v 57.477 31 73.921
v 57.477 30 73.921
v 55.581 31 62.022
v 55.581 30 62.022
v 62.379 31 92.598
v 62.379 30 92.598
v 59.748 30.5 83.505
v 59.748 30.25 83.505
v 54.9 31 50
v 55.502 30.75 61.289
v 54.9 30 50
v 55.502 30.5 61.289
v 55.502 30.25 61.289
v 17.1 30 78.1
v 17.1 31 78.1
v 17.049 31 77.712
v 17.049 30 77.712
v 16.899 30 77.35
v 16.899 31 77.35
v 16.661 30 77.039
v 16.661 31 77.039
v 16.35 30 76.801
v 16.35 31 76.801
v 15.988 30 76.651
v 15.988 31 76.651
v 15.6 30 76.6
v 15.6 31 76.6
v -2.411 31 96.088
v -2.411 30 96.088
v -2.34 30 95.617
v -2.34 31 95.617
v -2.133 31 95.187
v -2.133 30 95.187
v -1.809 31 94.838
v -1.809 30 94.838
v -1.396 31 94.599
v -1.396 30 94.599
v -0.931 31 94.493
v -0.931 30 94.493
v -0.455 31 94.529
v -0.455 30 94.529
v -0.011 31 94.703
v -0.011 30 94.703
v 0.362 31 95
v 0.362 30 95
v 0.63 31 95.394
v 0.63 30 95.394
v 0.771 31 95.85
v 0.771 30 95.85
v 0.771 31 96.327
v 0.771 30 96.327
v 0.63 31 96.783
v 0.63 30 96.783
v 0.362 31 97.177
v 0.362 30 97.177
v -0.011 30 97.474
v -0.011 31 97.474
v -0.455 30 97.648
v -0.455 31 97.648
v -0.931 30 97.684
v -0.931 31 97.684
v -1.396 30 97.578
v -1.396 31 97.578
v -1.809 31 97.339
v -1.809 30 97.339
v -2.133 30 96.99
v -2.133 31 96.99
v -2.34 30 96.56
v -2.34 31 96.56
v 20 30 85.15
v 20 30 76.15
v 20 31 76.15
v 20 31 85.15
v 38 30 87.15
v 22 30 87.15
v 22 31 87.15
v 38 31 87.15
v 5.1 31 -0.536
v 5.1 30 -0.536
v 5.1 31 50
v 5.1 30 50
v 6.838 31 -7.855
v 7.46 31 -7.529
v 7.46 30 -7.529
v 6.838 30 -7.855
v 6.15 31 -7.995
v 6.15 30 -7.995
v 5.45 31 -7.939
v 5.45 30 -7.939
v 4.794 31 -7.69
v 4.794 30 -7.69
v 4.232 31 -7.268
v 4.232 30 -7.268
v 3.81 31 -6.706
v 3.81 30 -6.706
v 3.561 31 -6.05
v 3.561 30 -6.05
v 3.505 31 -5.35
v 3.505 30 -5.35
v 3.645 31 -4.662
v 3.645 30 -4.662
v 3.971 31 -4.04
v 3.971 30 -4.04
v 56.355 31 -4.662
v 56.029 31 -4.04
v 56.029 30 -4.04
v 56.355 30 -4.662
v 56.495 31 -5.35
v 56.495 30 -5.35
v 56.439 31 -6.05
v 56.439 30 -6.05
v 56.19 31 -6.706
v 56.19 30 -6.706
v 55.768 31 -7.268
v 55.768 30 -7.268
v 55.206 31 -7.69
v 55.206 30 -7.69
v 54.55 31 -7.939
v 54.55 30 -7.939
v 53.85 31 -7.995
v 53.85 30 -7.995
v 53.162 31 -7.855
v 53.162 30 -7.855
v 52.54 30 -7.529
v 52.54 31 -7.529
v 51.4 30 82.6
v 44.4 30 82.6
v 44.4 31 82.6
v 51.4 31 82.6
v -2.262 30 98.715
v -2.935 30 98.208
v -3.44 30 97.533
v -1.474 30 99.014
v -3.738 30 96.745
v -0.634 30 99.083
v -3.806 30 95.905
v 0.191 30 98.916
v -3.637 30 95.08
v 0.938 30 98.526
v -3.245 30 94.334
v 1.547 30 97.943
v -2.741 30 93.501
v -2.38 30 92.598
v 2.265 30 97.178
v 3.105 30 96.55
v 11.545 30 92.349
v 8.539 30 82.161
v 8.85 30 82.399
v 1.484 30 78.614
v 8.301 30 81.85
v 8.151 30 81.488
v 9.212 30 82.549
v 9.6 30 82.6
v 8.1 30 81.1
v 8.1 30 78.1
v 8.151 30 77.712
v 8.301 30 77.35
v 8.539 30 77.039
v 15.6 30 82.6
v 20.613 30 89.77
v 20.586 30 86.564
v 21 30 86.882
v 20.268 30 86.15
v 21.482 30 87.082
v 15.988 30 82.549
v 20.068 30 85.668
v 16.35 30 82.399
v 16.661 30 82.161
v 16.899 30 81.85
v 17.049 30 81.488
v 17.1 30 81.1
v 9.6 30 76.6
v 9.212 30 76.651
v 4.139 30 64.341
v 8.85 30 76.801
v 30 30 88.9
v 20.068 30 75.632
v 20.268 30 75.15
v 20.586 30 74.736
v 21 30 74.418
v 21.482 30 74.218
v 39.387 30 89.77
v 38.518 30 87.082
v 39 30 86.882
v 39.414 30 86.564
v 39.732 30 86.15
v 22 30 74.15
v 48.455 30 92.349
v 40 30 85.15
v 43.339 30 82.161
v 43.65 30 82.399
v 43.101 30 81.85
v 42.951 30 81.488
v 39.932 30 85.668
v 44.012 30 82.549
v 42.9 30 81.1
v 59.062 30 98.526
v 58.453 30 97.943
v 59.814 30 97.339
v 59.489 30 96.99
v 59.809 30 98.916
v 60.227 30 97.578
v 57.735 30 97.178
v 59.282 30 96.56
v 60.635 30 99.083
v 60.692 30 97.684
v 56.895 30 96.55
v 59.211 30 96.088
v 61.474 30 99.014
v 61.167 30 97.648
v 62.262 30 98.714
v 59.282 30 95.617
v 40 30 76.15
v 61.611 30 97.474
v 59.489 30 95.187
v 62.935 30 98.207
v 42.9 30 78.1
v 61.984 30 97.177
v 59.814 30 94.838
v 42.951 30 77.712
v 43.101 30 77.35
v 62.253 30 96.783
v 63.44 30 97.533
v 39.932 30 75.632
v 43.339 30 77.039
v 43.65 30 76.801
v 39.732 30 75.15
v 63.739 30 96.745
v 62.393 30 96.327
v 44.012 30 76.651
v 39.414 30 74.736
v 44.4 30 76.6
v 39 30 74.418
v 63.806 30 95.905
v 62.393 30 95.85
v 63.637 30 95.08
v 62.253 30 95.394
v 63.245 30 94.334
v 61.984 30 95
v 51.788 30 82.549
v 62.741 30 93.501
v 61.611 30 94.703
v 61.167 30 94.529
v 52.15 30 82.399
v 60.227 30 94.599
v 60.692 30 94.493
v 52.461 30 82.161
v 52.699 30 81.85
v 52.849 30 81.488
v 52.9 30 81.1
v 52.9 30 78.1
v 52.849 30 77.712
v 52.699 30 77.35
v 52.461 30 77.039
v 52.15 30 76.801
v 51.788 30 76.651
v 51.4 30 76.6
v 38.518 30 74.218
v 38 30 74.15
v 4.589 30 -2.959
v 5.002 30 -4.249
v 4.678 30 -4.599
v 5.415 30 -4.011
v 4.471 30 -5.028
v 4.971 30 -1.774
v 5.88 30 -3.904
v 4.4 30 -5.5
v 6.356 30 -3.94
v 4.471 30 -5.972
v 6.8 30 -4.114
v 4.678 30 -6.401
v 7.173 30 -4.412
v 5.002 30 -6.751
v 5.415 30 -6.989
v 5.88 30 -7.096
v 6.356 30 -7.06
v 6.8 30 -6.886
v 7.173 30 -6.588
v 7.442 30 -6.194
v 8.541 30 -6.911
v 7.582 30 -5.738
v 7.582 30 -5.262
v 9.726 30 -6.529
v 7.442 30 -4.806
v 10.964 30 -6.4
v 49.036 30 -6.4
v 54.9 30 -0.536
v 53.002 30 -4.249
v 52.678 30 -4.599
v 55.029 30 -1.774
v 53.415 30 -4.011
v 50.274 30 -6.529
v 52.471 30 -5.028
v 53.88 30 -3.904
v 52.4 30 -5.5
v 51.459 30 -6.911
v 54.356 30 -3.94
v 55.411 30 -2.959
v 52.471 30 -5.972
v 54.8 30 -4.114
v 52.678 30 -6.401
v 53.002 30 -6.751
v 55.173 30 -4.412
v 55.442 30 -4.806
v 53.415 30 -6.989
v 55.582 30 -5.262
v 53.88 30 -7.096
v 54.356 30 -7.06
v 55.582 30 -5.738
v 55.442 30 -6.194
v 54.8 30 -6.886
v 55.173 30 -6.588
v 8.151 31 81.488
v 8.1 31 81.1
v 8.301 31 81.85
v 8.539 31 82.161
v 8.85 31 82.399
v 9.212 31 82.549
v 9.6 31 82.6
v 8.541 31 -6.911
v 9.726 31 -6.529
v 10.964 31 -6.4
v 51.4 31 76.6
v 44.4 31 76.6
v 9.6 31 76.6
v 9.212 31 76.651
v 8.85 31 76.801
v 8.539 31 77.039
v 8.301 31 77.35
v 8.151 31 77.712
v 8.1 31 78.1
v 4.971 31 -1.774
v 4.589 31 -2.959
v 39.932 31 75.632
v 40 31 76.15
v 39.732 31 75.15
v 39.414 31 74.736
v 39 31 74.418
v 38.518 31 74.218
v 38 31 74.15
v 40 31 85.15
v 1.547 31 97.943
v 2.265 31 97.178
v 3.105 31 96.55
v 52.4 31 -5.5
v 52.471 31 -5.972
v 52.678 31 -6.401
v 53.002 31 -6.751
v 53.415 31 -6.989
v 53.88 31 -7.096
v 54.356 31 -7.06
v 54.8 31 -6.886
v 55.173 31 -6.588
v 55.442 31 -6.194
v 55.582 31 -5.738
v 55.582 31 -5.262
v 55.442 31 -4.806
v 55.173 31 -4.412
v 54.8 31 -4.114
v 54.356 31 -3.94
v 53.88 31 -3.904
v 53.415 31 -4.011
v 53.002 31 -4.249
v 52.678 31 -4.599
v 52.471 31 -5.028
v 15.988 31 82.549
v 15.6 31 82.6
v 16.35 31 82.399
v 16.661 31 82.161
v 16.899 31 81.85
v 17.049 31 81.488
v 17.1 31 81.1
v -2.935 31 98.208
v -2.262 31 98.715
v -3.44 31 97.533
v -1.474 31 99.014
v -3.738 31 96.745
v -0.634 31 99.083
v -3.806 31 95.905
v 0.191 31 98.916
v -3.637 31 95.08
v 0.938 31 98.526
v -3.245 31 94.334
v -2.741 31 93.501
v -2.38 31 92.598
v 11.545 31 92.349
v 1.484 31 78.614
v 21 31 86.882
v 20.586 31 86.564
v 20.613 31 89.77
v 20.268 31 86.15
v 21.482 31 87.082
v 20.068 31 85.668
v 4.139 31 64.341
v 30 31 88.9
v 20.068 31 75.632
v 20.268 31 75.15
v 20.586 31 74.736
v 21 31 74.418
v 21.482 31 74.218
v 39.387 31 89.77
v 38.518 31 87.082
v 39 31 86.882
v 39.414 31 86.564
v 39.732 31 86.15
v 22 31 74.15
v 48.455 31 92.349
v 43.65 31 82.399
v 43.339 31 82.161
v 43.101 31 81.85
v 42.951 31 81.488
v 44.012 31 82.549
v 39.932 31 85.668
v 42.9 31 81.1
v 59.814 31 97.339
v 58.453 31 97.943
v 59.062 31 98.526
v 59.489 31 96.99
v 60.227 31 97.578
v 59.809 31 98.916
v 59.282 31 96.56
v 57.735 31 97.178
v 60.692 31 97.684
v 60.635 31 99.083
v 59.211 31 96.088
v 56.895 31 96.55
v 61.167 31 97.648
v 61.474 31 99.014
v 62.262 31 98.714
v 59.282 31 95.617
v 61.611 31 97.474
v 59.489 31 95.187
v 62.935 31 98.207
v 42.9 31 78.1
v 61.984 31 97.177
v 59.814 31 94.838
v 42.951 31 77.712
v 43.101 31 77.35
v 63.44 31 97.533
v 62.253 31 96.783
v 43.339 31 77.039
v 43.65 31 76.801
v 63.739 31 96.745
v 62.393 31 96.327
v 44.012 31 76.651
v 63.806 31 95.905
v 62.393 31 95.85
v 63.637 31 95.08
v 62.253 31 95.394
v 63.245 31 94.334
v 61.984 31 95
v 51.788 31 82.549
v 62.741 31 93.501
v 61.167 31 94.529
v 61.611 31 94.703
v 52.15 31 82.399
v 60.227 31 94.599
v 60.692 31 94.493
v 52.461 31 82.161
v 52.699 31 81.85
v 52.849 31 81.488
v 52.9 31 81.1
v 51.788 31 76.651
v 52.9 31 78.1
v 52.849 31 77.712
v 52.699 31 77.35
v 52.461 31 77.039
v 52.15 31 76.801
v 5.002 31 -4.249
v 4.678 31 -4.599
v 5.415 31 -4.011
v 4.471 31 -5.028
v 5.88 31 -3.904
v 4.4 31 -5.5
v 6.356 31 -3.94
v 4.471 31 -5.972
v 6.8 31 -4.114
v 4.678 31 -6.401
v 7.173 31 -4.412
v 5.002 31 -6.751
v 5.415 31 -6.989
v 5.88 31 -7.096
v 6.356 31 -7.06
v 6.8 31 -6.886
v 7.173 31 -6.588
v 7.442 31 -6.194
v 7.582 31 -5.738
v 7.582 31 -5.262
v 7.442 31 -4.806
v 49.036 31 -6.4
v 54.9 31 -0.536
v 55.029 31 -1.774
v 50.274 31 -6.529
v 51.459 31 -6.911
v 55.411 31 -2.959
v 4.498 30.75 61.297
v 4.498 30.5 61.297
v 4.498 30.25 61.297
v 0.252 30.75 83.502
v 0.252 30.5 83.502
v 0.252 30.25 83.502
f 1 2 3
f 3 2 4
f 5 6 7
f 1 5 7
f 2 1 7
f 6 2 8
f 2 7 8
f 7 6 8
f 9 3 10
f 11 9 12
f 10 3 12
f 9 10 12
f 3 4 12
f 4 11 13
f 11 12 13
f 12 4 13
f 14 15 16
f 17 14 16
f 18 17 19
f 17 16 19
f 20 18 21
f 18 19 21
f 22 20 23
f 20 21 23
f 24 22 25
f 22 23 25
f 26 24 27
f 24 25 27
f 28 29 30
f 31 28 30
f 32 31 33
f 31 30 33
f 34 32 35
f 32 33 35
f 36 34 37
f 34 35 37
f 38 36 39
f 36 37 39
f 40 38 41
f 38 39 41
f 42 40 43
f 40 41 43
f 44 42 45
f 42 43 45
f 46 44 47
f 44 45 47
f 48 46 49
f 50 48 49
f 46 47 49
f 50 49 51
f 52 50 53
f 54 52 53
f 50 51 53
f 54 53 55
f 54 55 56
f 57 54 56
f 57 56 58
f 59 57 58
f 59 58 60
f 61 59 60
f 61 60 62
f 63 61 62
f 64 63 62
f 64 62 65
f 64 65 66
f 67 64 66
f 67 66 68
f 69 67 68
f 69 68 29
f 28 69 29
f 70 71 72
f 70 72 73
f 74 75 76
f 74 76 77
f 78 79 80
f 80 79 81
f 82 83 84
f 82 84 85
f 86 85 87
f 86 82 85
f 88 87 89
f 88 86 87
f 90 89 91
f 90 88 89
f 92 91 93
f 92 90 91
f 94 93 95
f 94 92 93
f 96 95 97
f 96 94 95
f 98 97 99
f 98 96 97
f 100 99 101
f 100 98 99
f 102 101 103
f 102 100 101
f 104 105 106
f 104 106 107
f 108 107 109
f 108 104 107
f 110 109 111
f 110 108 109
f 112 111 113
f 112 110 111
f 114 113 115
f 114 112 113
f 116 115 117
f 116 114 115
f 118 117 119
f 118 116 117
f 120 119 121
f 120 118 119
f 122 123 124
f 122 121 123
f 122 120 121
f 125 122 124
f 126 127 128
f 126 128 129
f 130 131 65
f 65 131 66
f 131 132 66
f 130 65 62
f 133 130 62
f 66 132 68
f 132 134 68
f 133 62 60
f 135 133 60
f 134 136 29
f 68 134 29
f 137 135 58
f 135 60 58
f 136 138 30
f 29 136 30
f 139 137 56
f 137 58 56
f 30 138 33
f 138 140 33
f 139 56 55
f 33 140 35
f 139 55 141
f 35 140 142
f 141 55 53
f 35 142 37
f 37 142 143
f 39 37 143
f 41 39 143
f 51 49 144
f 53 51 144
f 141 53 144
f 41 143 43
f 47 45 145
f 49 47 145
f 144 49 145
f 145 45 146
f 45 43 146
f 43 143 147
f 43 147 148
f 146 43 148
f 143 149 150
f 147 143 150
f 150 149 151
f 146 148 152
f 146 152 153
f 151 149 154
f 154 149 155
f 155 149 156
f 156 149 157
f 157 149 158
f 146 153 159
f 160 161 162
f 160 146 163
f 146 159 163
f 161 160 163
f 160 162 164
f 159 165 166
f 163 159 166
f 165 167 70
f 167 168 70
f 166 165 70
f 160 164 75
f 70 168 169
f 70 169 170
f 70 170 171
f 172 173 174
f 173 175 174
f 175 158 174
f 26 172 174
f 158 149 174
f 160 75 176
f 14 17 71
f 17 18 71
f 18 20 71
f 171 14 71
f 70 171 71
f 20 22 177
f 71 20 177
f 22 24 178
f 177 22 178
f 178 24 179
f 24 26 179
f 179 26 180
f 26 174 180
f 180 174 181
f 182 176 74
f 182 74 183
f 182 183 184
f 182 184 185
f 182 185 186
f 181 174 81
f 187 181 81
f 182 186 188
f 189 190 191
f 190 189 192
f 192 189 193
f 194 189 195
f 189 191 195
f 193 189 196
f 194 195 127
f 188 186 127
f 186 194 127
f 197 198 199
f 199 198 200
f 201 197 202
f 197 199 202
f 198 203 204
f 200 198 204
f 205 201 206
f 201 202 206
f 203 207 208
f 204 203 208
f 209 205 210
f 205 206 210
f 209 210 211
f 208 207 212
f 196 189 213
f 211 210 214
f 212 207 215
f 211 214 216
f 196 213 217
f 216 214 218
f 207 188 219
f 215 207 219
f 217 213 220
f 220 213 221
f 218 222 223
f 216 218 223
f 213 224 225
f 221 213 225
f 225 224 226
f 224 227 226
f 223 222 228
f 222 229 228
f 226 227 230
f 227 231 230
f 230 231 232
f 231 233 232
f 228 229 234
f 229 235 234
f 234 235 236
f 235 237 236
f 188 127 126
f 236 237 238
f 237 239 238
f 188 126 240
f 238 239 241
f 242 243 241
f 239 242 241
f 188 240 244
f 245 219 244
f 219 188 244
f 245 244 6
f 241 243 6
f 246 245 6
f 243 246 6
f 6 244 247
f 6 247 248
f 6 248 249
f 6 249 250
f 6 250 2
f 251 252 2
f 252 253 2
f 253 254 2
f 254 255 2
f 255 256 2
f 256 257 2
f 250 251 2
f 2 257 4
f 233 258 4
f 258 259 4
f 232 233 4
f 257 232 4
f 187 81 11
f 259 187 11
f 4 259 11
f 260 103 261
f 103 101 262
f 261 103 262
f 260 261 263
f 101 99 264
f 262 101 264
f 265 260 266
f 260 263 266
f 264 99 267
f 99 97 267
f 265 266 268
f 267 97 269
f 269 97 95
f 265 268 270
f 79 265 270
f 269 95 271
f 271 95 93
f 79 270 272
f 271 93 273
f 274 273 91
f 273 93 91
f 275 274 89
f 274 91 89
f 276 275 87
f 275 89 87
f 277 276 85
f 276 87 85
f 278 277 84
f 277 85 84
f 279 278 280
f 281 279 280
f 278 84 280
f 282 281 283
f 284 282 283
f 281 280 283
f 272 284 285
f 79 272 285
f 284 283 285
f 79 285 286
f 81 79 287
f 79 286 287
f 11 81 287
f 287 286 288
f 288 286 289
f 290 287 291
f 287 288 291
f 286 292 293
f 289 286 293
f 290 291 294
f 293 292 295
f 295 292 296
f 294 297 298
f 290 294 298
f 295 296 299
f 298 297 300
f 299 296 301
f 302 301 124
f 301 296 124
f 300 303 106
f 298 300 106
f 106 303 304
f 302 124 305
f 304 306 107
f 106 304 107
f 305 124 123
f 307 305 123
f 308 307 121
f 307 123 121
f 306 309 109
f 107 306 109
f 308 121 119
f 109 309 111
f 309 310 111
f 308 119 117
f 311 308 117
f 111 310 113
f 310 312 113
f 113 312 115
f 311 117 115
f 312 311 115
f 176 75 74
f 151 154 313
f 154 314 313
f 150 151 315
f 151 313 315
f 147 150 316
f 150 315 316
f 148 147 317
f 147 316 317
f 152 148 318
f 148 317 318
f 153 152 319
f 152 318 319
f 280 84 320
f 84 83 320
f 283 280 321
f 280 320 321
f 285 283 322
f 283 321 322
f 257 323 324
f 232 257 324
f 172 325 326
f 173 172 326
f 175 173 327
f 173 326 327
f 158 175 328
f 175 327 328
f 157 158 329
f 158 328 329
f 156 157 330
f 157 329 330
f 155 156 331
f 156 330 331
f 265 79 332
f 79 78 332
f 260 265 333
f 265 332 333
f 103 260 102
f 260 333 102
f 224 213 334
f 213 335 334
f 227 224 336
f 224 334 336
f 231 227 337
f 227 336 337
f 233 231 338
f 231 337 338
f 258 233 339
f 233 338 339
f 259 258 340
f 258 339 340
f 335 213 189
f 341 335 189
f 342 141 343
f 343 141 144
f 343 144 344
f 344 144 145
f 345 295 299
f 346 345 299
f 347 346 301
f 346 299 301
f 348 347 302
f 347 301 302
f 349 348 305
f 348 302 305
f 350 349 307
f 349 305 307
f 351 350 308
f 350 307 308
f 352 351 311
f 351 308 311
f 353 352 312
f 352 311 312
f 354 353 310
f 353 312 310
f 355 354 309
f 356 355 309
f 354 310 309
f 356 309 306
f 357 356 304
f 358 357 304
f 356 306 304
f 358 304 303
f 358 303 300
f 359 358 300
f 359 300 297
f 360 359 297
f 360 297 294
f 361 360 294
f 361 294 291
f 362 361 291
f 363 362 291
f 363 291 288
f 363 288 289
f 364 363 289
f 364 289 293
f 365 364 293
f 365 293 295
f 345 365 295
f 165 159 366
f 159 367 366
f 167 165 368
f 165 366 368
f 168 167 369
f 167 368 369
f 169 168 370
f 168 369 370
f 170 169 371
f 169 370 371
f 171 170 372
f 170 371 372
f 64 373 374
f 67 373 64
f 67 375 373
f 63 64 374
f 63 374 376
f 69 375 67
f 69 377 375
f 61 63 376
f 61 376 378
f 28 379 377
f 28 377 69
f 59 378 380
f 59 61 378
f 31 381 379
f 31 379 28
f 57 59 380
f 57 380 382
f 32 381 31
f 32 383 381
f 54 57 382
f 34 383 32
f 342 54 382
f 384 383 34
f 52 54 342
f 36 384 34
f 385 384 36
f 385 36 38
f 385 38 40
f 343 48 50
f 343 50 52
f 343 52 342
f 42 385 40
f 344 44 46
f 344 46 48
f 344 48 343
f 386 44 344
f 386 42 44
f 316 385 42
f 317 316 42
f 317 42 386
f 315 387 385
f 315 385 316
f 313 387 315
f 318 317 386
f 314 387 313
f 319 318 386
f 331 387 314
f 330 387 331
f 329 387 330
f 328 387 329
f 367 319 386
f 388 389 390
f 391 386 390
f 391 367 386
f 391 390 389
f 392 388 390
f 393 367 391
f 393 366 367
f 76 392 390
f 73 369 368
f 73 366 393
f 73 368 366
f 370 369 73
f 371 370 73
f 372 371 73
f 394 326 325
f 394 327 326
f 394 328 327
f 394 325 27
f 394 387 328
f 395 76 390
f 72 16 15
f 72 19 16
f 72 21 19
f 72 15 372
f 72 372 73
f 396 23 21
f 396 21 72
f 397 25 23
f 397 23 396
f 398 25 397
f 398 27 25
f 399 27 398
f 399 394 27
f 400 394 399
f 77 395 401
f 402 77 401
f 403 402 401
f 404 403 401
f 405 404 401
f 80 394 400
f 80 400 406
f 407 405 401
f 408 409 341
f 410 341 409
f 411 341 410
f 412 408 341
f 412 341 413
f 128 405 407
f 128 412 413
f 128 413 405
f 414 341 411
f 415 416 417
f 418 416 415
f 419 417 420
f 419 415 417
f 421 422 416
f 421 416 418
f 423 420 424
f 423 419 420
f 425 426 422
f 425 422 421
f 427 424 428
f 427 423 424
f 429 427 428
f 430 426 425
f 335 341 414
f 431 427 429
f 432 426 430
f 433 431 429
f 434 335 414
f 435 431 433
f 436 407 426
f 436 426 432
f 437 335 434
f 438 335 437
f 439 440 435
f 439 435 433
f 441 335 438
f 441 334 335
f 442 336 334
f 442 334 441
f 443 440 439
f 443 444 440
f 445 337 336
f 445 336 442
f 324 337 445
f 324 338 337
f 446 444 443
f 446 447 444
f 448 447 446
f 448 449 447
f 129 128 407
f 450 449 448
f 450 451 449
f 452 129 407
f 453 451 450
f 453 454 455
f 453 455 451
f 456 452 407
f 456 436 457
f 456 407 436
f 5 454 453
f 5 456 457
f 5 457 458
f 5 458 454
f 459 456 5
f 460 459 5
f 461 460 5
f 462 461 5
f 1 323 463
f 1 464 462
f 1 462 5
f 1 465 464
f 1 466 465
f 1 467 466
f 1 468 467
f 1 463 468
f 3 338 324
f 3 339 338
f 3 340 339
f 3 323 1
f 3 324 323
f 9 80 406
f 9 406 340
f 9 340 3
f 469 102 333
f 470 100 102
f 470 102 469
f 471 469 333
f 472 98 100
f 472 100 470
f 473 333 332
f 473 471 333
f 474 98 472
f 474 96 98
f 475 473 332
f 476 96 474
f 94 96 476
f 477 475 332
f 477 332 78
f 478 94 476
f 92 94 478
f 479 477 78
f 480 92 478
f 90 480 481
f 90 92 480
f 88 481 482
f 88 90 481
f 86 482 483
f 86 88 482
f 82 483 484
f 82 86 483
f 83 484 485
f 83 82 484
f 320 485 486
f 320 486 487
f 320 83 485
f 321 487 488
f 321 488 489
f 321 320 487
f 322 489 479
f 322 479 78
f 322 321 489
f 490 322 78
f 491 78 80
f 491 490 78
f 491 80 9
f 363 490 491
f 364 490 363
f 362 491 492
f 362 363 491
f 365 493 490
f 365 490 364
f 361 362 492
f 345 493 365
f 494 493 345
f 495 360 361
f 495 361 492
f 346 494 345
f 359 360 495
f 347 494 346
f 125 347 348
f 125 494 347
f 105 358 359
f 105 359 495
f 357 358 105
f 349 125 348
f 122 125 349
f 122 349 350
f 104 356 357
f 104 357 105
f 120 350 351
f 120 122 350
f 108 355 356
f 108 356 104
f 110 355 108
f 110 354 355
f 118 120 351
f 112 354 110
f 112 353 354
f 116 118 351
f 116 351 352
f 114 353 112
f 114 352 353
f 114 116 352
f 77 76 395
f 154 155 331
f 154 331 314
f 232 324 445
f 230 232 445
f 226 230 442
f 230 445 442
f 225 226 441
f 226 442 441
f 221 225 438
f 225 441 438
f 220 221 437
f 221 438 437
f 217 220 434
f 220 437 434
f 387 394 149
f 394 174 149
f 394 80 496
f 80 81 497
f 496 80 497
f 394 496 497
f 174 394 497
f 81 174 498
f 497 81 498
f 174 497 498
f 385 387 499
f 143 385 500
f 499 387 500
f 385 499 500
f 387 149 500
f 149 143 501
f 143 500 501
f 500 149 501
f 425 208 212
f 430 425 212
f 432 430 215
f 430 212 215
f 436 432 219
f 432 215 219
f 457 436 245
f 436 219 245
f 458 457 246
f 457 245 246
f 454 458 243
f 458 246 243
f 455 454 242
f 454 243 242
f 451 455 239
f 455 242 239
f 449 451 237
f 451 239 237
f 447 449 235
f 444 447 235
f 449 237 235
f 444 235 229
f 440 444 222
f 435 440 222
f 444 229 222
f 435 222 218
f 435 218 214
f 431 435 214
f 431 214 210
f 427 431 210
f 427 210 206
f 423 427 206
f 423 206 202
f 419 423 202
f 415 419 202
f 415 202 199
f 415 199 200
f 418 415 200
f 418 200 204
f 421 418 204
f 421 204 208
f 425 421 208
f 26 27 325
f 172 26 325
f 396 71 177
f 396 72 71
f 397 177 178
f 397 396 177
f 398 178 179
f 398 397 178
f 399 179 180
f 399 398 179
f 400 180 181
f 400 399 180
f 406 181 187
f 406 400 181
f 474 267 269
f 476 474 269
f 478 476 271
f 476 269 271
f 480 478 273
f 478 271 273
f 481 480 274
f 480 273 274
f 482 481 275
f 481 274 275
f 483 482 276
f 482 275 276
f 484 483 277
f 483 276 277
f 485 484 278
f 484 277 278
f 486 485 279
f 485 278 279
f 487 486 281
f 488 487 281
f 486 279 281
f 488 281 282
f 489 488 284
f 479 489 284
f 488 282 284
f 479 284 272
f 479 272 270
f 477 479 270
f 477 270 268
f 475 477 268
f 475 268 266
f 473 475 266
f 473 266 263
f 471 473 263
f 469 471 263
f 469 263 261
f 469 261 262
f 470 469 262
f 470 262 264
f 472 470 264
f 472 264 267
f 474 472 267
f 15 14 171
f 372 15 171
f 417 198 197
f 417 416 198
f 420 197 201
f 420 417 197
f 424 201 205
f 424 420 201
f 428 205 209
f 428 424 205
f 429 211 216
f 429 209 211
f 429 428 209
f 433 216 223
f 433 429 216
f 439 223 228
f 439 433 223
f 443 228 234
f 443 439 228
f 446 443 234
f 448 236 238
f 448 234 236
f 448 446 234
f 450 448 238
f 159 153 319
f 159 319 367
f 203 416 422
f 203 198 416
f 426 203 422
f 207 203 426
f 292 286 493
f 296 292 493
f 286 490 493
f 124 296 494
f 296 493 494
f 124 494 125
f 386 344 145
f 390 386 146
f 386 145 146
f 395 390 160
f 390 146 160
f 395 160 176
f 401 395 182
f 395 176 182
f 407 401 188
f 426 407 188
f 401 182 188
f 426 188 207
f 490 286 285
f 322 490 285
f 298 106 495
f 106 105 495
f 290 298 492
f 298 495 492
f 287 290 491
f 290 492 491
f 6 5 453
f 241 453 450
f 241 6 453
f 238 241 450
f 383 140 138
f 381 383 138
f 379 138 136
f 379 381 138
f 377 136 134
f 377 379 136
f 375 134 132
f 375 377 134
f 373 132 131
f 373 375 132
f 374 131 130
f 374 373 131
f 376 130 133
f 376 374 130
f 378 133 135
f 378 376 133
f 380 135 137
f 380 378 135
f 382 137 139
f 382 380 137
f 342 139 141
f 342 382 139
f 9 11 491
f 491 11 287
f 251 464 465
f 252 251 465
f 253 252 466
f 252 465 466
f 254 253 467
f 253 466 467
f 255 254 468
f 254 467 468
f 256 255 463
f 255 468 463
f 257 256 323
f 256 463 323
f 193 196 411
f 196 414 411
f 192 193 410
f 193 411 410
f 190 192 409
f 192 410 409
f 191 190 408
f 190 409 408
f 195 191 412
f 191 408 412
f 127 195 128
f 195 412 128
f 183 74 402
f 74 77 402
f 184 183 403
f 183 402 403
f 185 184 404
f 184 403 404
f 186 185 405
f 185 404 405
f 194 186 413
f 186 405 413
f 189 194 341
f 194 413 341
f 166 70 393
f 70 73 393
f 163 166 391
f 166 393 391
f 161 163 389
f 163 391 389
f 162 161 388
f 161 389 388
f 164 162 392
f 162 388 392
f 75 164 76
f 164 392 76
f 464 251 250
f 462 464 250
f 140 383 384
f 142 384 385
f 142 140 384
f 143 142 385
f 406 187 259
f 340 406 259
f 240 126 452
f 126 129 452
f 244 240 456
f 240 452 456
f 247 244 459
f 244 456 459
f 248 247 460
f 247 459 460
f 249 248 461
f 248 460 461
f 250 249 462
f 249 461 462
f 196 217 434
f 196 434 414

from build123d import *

# Parameters (mm, degrees)
COVER_MAIN_BOARD_1_START = 30
COVER_MAIN_BOARD_1_DEPTH = 1
SKETCH_2_R               = 2.5
SKETCH_2_R_2             = 3
EXTRUDE_1_DEPTH          = 1
FILLET_1_R               = 6
HOLE_WIZARD_M31_D        = 3.2
SKETCH_5_W               = 20
SKETCH_5_H               = 13
CUT_EXTRUDE_2_DEPTH      = 118.861812366
FILLET_2_R               = 2
SKETCH_7_W               = 10
SKETCH_7_H               = 4
SKETCH_7_W_2             = 9
CUT_EXTRUDE_4_DEPTH      = 118.861812366
FILLET_3_R               = 1.5
CUT_EXTRUDE_5_DEPTH      = 118.861812366


# Read off the part's stored shape, not the designer's step: Припуск-Cover_main_board-1
with BuildPart() as part:
    # Припуск-Cover_main_board-1 outline → Припуск-Cover_main_board-1 (new body)
    with BuildSketch(Plane(origin=(0, 0, 0), x_dir=(1, 0, 0), z_dir=(0, 1, 0)).offset(COVER_MAIN_BOARD_1_START)):
        with BuildLine():
            ThreePointArc((58.536662962, -97.610509717), (61.872887908, -97.542255565), (62.936422695, -94.379353532))
            add(Edge.make_bspline(
                [(62.936422695, -94.379353532), (61.798177223, -90.776493028), (60.72075986, -87.155811957), (58.774674414, -79.85329338), (57.908149184, -76.177190929), (56.466060339, -68.758031881), (55.893308454, -65.032046108), (55.109773151, -57.544971093), (54.899999704, -53.783069267), (54.9, -50)],
                knots=[0, 0, 0, 0, 0.25, 0.25, 0.5, 0.5, 0.75, 0.75, 1, 1, 1, 1], degree=3))
            Line((54.9, -50), (54.9, 6.4))
            Line((54.9, 6.4), (5.1, 6.4))
            Line((5.1, 6.4), (5.1, -50))
            add(Edge.make_bspline(
                [(5.1, -50), (5.099991031, -53.776486453), (4.890826579, -57.541590974), (4.10432522, -65.051764617), (3.53002006, -68.780548712), (2.088476888, -76.191600122), (1.222062078, -79.86132679), (-0.718312327, -87.143485068), (-1.7924779, -90.75713228), (-2.928662588, -94.354417399)],
                knots=[0, 0, 0, 0, 0.25, 0.25, 0.5, 0.5, 0.75, 0.75, 1, 1, 1, 1], degree=3))
            ThreePointArc((-2.928662588, -94.354417399), (-1.883263044, -97.534459074), (1.463338472, -97.610508751))
            ThreePointArc((1.463338472, -97.610508751), (30.000000864, -88.89999981), (58.536662962, -97.610509717))
        make_face()
    extrude(amount=COVER_MAIN_BOARD_1_DEPTH)

    # Эскиз2 → Бобышка-Вытянуть1 (add)
    with BuildSketch(Plane(origin=(0, 31, 0), x_dir=(1, 0, 0), z_dir=(0, 1, 0))):
        with Locations((6, 5.5)):
            Circle(SKETCH_2_R)
        with Locations((54, 5.5)):
            Circle(SKETCH_2_R)
        with Locations((-0.811267397, -96.088490424)):
            Circle(SKETCH_2_R_2)
        with Locations((60.811267397, -96.088490424)):
            Circle(SKETCH_2_R_2)
    extrude(amount=-EXTRUDE_1_DEPTH)

    # Скругление1
    fillet_1_edges = [part.edges().sort_by_distance(p)[0] for p in [
        (-2.75519034, 30.5, 93.803503862),
        (1.934506666, 30.5, 97.297094907),
        (58.065493335, 30.5, 97.297094908),
        (62.755023846, 30.5, 93.803362229),
        (54.9, 30.5, -3.167619242),
        (51.667619242, 30.5, -6.4),
        (8.332380758, 30.5, -6.4),
        (5.1, 30.5, -3.167619242),
    ]]
    fillet(fillet_1_edges, radius=FILLET_1_R)

    # Отверстие с зазором M31 (through all)
    with Locations(Plane(origin=(0, 31, 0), x_dir=(1, 0, 0), z_dir=(0, 1, 0))):
        with Locations((-0.811267397, -96.088490424), (60.811267397, -96.088490424), (54, 5.5), (6, 5.5)):
            Hole(HOLE_WIZARD_M31_D / 2)

    # Эскиз5 → Вырез-Вытянуть2 (cut, through all)
    with BuildSketch(Plane.XZ.offset(-30)):
        with Locations((30, 80.64999981)):
            Rectangle(SKETCH_5_W, SKETCH_5_H)
    extrude(amount=-CUT_EXTRUDE_2_DEPTH, mode=Mode.SUBTRACT)

    # Скругление2
    fillet_2_edges = [part.edges().sort_by_distance(p)[0] for p in [
        (40, 30.5, 87.14999981),
        (40, 30.5, 74.14999981),
        (20, 30.5, 74.14999981),
        (20, 30.5, 87.14999981),
    ]]
    fillet(fillet_2_edges, radius=FILLET_2_R)

    # Эскиз7 → Вырез-Вытянуть4 (cut, through all)
    with BuildSketch(Plane.XZ.offset(-30)):
        with Locations((47.9, 80.6)):
            Rectangle(SKETCH_7_W, SKETCH_7_H)
        with Locations((12.6, 80.6)):
            Rectangle(SKETCH_7_W_2, SKETCH_7_H)
    extrude(amount=-CUT_EXTRUDE_4_DEPTH, mode=Mode.SUBTRACT)

    # Скругление3
    fillet_3_edges = [part.edges().sort_by_distance(p)[0] for p in [
        (42.9, 30.5, 78.6),
        (42.9, 30.5, 82.6),
        (52.9, 30.5, 82.6),
        (52.9, 30.5, 78.6),
        (17.1, 30.5, 82.6),
        (17.1, 30.5, 78.6),
        (8.1, 30.5, 78.6),
        (8.1, 30.5, 82.6),
    ]]
    fillet(fillet_3_edges, radius=FILLET_3_R)

    # Эскиз10 → Вырез-Вытянуть5 (cut, through all)
    with BuildSketch(Plane(origin=(0, 31, 0), x_dir=(1, 0, 0), z_dir=(0, 1, 0))):
        with BuildLine():
            Line((42.9, -80.1), (52.9, -80.1))
            Line((52.9, -80.1), (52.9, -78.1))
            ThreePointArc((52.9, -78.1), (52.460660172, -77.039339828), (51.4, -76.6))
            Line((51.4, -76.6), (44.4, -76.6))
            ThreePointArc((44.4, -76.6), (43.339339828, -77.039339828), (42.9, -78.1))
            Line((42.9, -78.1), (42.9, -80.1))
        make_face()
        with BuildLine():
            Line((8.1, -80.1), (17.1, -80.1))
            Line((17.1, -80.1), (17.1, -78.1))
            ThreePointArc((17.1, -78.1), (16.660660172, -77.039339828), (15.6, -76.6))
            Line((15.6, -76.6), (9.6, -76.6))
            ThreePointArc((9.6, -76.6), (8.539339828, -77.039339828), (8.1, -78.1))
            Line((8.1, -78.1), (8.1, -80.1))
        make_face()
    extrude(amount=-CUT_EXTRUDE_5_DEPTH, mode=Mode.SUBTRACT)


solid = part.part
